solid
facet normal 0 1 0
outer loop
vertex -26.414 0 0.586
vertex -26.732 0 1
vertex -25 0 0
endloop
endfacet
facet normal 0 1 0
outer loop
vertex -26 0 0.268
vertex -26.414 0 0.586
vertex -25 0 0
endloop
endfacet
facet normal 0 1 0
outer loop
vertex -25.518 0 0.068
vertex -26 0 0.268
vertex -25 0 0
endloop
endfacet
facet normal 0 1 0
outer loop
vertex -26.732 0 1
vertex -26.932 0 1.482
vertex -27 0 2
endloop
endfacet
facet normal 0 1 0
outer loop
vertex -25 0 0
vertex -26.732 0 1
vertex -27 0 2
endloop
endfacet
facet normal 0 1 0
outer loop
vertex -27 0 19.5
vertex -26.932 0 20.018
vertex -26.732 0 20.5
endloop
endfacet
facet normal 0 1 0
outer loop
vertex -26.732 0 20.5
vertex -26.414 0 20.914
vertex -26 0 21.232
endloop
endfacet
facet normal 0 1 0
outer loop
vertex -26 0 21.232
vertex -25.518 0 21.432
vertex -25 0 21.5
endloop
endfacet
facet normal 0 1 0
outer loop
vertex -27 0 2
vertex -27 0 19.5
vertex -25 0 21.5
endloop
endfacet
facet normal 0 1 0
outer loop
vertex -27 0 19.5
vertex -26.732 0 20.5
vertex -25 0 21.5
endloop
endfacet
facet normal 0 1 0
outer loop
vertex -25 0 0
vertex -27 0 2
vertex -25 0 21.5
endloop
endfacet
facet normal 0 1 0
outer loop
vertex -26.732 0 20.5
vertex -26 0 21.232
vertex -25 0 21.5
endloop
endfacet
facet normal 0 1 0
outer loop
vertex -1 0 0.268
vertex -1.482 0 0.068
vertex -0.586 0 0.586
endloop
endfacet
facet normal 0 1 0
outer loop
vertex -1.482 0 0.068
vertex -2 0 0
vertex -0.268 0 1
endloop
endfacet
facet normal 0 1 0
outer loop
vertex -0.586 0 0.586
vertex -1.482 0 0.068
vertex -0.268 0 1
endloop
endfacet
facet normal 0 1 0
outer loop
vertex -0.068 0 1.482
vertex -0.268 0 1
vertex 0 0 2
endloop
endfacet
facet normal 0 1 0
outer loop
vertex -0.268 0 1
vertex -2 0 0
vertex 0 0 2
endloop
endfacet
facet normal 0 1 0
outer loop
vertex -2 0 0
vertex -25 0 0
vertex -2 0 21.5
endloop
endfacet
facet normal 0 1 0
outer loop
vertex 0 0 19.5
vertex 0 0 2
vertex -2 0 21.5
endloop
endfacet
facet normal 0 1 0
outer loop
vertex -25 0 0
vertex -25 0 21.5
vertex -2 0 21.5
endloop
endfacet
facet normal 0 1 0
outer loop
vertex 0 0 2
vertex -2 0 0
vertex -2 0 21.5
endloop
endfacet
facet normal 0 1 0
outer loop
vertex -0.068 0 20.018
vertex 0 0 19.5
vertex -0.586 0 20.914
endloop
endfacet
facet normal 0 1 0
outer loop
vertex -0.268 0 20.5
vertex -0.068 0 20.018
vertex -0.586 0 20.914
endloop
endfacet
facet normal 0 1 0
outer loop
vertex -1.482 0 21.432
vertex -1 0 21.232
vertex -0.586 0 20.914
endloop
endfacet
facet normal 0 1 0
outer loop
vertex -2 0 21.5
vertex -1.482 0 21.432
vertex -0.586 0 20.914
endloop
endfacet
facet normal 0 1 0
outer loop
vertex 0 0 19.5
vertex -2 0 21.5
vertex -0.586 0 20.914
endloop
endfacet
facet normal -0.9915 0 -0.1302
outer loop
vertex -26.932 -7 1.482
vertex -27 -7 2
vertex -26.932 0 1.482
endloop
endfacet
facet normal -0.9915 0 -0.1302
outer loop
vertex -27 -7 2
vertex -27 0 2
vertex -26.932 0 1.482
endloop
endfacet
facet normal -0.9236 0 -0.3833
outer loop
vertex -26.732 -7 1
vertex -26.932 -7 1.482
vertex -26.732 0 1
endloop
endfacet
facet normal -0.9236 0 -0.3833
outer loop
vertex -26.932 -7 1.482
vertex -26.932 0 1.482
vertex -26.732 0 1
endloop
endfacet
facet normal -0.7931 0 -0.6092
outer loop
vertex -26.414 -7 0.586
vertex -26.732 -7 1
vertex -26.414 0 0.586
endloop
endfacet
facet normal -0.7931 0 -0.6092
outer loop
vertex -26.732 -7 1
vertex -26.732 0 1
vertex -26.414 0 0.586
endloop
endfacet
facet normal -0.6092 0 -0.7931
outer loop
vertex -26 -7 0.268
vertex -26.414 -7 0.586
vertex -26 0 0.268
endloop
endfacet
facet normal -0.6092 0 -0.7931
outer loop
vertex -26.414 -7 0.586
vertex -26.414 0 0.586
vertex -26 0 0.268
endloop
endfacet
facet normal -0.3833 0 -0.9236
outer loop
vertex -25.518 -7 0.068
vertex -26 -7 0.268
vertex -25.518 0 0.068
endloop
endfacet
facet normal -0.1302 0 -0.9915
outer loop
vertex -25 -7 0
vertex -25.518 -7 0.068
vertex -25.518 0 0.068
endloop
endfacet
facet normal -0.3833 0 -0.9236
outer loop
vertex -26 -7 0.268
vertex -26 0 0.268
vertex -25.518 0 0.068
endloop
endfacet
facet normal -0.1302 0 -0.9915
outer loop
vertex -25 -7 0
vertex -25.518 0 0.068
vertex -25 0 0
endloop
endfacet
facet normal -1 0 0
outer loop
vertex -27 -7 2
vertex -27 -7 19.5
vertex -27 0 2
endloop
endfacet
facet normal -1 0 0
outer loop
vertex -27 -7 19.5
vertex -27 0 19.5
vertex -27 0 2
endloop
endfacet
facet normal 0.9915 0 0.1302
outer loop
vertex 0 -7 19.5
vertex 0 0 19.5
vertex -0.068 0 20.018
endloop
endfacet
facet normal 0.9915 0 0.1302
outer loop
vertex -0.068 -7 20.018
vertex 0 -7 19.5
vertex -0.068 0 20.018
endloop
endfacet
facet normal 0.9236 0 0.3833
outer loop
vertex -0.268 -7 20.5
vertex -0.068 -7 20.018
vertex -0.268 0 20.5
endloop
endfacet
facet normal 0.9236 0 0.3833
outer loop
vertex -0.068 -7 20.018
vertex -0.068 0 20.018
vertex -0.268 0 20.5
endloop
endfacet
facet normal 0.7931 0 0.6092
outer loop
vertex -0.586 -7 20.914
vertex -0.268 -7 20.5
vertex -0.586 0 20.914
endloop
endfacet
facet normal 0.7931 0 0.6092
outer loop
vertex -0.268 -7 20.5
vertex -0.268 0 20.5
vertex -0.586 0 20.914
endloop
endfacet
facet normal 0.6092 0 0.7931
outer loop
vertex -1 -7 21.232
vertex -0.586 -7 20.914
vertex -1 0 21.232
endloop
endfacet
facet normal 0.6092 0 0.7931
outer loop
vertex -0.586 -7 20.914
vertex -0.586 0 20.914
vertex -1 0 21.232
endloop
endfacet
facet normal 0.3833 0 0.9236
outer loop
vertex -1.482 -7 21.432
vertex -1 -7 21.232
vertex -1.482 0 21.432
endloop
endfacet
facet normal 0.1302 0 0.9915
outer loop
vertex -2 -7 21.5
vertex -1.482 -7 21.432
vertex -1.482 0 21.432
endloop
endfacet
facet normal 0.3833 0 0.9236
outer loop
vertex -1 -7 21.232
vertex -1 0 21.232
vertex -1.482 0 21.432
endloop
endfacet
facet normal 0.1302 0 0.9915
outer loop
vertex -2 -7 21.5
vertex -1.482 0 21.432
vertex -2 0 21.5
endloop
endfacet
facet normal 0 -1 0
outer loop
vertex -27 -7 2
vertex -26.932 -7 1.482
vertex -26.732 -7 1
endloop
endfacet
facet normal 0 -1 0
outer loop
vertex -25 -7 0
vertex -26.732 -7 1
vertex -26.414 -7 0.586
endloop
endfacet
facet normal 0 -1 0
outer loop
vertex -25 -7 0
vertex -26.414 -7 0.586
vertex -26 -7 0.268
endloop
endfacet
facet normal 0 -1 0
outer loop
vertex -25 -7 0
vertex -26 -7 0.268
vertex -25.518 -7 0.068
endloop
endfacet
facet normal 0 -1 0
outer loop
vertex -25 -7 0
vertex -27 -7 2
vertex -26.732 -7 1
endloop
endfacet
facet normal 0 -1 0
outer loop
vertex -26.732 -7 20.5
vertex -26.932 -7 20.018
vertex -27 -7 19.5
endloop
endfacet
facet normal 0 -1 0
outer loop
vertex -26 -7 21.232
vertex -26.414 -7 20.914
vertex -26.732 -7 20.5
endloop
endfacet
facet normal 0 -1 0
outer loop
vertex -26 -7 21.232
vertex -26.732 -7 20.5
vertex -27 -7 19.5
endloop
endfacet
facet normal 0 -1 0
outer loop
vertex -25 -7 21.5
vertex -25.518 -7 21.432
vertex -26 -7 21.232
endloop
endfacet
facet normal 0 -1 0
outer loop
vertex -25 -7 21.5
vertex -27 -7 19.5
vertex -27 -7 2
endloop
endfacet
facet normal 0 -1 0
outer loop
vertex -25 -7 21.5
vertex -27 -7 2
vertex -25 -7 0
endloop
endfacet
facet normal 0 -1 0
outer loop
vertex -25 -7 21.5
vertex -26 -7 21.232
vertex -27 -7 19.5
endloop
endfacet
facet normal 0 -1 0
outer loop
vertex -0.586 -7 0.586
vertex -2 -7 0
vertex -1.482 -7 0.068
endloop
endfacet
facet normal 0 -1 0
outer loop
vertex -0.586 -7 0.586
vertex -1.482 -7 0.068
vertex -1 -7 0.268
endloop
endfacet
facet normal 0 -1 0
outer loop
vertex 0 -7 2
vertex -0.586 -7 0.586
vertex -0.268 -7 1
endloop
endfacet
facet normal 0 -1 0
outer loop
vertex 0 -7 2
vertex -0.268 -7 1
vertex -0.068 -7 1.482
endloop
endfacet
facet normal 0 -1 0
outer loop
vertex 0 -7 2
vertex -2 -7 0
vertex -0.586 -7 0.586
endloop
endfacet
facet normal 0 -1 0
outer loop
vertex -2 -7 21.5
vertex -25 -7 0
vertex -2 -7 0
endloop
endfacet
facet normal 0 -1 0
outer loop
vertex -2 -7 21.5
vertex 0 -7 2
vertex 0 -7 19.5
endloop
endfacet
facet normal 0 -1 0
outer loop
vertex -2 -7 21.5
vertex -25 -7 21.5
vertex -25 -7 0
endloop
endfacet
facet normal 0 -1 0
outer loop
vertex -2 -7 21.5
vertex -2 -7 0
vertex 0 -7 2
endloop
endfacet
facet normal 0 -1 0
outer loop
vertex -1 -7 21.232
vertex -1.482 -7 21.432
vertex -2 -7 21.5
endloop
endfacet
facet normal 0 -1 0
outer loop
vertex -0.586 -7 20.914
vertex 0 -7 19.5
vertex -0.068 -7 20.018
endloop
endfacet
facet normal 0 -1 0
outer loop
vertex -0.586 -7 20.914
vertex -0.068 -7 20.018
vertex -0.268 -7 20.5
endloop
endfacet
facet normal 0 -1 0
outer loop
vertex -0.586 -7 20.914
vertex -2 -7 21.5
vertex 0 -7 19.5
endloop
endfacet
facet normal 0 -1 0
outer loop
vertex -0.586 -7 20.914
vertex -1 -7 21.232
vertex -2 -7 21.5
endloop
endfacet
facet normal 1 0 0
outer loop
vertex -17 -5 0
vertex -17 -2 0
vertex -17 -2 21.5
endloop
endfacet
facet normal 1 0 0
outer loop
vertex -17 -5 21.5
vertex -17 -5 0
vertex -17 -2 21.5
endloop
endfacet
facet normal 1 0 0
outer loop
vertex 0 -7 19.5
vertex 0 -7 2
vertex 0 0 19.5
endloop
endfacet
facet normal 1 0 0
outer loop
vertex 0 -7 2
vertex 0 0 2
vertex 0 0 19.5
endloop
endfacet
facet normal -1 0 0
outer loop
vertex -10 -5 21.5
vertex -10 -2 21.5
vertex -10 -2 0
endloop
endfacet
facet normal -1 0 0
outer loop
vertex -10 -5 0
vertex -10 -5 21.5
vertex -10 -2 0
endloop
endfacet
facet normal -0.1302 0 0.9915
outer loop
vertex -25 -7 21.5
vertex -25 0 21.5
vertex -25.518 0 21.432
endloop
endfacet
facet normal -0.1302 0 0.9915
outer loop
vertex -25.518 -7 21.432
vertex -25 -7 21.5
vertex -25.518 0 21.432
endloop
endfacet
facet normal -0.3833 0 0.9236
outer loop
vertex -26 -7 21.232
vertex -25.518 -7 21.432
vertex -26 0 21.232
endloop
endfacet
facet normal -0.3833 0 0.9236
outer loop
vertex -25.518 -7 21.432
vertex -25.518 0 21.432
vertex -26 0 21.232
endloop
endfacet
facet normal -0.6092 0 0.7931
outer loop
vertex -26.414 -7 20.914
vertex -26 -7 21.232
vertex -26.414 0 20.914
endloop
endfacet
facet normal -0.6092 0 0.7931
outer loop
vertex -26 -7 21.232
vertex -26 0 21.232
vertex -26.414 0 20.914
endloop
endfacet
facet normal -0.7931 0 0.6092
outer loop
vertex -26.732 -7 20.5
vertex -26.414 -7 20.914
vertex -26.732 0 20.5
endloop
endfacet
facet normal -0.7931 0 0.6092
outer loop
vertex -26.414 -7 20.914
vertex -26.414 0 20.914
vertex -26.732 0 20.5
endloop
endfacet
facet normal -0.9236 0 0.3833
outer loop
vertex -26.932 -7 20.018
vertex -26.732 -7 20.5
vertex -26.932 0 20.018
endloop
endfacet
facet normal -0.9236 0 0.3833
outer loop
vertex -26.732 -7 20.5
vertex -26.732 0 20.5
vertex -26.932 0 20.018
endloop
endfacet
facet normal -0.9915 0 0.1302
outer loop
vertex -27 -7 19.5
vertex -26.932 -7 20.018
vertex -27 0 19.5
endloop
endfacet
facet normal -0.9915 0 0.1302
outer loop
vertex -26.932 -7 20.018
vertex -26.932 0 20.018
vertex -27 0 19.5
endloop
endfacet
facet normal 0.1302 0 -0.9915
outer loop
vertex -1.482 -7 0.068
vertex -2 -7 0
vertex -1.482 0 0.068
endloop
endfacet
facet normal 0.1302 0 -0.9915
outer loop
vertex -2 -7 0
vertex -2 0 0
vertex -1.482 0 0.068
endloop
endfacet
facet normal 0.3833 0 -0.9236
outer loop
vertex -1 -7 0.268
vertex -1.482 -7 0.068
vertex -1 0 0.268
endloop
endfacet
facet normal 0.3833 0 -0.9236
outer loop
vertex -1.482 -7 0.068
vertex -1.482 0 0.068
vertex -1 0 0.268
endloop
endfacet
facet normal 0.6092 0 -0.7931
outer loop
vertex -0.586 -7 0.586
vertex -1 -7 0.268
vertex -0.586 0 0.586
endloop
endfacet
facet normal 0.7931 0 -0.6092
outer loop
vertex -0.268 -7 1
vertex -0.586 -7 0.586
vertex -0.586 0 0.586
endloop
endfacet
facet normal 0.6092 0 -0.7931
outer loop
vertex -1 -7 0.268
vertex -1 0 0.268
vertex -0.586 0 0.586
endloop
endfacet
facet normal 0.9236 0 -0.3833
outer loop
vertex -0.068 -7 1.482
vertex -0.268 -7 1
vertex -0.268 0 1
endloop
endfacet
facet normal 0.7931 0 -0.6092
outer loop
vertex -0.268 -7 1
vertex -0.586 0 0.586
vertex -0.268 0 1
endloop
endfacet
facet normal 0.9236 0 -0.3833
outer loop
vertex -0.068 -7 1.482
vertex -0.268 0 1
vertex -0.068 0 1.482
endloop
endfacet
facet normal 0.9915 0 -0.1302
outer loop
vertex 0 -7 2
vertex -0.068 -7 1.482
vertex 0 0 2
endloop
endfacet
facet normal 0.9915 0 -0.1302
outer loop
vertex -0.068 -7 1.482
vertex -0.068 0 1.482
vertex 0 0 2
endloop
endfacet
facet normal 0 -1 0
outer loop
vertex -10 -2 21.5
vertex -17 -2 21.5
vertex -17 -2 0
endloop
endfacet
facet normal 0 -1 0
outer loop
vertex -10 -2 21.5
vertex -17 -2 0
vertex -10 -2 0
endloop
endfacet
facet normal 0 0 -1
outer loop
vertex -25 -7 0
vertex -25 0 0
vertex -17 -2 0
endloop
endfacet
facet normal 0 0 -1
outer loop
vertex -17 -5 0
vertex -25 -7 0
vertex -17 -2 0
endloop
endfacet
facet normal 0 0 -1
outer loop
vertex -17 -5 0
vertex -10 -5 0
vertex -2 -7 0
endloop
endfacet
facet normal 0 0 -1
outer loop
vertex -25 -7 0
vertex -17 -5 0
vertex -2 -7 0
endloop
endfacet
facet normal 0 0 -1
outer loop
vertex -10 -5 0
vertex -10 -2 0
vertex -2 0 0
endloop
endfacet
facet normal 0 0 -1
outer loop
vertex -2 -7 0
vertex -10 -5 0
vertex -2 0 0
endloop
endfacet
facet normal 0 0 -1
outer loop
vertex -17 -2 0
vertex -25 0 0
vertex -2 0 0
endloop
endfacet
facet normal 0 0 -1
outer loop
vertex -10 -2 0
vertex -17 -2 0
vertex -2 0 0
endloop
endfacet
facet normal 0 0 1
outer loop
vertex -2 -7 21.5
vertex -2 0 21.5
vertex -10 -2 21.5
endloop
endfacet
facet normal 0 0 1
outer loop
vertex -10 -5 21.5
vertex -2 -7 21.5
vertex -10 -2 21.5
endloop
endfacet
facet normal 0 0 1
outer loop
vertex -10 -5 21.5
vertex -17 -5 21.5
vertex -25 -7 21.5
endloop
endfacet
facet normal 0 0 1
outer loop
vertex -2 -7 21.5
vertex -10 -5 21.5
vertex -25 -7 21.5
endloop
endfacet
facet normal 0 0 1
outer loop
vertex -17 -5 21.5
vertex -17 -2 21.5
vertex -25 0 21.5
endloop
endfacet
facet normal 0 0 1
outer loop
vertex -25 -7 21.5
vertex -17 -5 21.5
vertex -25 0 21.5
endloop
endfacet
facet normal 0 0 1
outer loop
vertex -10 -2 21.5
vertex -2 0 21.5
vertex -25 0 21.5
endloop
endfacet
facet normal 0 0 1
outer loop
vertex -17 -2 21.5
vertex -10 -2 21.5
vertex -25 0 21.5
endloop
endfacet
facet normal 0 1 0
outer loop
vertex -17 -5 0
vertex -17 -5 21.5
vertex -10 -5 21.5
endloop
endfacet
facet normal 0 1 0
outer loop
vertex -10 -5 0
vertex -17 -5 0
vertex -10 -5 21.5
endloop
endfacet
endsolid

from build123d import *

# Parameters (mm, degrees)
F1_DEPTH = 2
F3_DEPTH = 3
F5_DEPTH = 2


with BuildPart() as f1:
    # F0 (on Front) → F1 (new body)
    with BuildSketch(Plane.XZ):
        with BuildLine():
            Line((-25, 0), (-2, 0))
            ThreePointArc((-2, 0), (-0.585786, 0.585786), (0, 2))
            Line((0, 2), (0, 19.5))
            ThreePointArc((0, 19.5), (-0.585786, 20.914214), (-2, 21.5))
            Line((-2, 21.5), (-25, 21.5))
            ThreePointArc((-25, 21.5), (-26.414214, 20.914214), (-27, 19.5))
            Line((-27, 19.5), (-27, 2))
            ThreePointArc((-27, 2), (-26.414214, 0.585786), (-25, 0))
        make_face()
    extrude(amount=F1_DEPTH)

    # F2 (on face) → F3 (join)
    with BuildSketch(Plane.XZ.offset(2)):
        with BuildLine():
            Line((-25, 0), (-17, 0))
            Line((-17, 0), (-17, 21.5))
            Line((-17, 21.5), (-25, 21.5))
            ThreePointArc((-25, 21.5), (-26.414214, 20.914214), (-27, 19.5))
            Line((-27, 19.5), (-27, 2))
            ThreePointArc((-27, 2), (-26.414214, 0.585786), (-25, 0))
        make_face()
        with BuildLine():
            Line((-10, 0), (-2, 0))
            ThreePointArc((-2, 0), (-0.585786, 0.585786), (0, 2))
            Line((0, 2), (0, 19.5))
            ThreePointArc((0, 19.5), (-0.585786, 20.914214), (-2, 21.5))
            Line((-2, 21.5), (-10, 21.5))
            Line((-10, 21.5), (-10, 0))
        make_face()
    extrude(amount=F3_DEPTH)

    # F4 (on face) → F5 (join)
    with BuildSketch(Plane.XZ.offset(5)):
        with BuildLine():
            Line((-17, 21.5), (-25, 21.5))
            ThreePointArc((-25, 21.5), (-26.414214, 20.914214), (-27, 19.5))
            Line((-27, 19.5), (-27, 2))
            ThreePointArc((-27, 2), (-26.414214, 0.585786), (-25, 0))
            Line((-25, 0), (-17, 0))
            Line((-17, 0), (-17, 21.5))
        make_face()
        with BuildLine():
            Line((-2, 21.5), (-17, 21.5))
            Line((-17, 21.5), (-17, 0))
            Line((-17, 0), (-2, 0))
            ThreePointArc((-2, 0), (-0.585786, 0.585786), (0, 2))
            Line((0, 2), (0, 19.5))
            ThreePointArc((0, 19.5), (-0.585786, 20.914214), (-2, 21.5))
        make_face()
    extrude(amount=F5_DEPTH)


solid = f1.part
